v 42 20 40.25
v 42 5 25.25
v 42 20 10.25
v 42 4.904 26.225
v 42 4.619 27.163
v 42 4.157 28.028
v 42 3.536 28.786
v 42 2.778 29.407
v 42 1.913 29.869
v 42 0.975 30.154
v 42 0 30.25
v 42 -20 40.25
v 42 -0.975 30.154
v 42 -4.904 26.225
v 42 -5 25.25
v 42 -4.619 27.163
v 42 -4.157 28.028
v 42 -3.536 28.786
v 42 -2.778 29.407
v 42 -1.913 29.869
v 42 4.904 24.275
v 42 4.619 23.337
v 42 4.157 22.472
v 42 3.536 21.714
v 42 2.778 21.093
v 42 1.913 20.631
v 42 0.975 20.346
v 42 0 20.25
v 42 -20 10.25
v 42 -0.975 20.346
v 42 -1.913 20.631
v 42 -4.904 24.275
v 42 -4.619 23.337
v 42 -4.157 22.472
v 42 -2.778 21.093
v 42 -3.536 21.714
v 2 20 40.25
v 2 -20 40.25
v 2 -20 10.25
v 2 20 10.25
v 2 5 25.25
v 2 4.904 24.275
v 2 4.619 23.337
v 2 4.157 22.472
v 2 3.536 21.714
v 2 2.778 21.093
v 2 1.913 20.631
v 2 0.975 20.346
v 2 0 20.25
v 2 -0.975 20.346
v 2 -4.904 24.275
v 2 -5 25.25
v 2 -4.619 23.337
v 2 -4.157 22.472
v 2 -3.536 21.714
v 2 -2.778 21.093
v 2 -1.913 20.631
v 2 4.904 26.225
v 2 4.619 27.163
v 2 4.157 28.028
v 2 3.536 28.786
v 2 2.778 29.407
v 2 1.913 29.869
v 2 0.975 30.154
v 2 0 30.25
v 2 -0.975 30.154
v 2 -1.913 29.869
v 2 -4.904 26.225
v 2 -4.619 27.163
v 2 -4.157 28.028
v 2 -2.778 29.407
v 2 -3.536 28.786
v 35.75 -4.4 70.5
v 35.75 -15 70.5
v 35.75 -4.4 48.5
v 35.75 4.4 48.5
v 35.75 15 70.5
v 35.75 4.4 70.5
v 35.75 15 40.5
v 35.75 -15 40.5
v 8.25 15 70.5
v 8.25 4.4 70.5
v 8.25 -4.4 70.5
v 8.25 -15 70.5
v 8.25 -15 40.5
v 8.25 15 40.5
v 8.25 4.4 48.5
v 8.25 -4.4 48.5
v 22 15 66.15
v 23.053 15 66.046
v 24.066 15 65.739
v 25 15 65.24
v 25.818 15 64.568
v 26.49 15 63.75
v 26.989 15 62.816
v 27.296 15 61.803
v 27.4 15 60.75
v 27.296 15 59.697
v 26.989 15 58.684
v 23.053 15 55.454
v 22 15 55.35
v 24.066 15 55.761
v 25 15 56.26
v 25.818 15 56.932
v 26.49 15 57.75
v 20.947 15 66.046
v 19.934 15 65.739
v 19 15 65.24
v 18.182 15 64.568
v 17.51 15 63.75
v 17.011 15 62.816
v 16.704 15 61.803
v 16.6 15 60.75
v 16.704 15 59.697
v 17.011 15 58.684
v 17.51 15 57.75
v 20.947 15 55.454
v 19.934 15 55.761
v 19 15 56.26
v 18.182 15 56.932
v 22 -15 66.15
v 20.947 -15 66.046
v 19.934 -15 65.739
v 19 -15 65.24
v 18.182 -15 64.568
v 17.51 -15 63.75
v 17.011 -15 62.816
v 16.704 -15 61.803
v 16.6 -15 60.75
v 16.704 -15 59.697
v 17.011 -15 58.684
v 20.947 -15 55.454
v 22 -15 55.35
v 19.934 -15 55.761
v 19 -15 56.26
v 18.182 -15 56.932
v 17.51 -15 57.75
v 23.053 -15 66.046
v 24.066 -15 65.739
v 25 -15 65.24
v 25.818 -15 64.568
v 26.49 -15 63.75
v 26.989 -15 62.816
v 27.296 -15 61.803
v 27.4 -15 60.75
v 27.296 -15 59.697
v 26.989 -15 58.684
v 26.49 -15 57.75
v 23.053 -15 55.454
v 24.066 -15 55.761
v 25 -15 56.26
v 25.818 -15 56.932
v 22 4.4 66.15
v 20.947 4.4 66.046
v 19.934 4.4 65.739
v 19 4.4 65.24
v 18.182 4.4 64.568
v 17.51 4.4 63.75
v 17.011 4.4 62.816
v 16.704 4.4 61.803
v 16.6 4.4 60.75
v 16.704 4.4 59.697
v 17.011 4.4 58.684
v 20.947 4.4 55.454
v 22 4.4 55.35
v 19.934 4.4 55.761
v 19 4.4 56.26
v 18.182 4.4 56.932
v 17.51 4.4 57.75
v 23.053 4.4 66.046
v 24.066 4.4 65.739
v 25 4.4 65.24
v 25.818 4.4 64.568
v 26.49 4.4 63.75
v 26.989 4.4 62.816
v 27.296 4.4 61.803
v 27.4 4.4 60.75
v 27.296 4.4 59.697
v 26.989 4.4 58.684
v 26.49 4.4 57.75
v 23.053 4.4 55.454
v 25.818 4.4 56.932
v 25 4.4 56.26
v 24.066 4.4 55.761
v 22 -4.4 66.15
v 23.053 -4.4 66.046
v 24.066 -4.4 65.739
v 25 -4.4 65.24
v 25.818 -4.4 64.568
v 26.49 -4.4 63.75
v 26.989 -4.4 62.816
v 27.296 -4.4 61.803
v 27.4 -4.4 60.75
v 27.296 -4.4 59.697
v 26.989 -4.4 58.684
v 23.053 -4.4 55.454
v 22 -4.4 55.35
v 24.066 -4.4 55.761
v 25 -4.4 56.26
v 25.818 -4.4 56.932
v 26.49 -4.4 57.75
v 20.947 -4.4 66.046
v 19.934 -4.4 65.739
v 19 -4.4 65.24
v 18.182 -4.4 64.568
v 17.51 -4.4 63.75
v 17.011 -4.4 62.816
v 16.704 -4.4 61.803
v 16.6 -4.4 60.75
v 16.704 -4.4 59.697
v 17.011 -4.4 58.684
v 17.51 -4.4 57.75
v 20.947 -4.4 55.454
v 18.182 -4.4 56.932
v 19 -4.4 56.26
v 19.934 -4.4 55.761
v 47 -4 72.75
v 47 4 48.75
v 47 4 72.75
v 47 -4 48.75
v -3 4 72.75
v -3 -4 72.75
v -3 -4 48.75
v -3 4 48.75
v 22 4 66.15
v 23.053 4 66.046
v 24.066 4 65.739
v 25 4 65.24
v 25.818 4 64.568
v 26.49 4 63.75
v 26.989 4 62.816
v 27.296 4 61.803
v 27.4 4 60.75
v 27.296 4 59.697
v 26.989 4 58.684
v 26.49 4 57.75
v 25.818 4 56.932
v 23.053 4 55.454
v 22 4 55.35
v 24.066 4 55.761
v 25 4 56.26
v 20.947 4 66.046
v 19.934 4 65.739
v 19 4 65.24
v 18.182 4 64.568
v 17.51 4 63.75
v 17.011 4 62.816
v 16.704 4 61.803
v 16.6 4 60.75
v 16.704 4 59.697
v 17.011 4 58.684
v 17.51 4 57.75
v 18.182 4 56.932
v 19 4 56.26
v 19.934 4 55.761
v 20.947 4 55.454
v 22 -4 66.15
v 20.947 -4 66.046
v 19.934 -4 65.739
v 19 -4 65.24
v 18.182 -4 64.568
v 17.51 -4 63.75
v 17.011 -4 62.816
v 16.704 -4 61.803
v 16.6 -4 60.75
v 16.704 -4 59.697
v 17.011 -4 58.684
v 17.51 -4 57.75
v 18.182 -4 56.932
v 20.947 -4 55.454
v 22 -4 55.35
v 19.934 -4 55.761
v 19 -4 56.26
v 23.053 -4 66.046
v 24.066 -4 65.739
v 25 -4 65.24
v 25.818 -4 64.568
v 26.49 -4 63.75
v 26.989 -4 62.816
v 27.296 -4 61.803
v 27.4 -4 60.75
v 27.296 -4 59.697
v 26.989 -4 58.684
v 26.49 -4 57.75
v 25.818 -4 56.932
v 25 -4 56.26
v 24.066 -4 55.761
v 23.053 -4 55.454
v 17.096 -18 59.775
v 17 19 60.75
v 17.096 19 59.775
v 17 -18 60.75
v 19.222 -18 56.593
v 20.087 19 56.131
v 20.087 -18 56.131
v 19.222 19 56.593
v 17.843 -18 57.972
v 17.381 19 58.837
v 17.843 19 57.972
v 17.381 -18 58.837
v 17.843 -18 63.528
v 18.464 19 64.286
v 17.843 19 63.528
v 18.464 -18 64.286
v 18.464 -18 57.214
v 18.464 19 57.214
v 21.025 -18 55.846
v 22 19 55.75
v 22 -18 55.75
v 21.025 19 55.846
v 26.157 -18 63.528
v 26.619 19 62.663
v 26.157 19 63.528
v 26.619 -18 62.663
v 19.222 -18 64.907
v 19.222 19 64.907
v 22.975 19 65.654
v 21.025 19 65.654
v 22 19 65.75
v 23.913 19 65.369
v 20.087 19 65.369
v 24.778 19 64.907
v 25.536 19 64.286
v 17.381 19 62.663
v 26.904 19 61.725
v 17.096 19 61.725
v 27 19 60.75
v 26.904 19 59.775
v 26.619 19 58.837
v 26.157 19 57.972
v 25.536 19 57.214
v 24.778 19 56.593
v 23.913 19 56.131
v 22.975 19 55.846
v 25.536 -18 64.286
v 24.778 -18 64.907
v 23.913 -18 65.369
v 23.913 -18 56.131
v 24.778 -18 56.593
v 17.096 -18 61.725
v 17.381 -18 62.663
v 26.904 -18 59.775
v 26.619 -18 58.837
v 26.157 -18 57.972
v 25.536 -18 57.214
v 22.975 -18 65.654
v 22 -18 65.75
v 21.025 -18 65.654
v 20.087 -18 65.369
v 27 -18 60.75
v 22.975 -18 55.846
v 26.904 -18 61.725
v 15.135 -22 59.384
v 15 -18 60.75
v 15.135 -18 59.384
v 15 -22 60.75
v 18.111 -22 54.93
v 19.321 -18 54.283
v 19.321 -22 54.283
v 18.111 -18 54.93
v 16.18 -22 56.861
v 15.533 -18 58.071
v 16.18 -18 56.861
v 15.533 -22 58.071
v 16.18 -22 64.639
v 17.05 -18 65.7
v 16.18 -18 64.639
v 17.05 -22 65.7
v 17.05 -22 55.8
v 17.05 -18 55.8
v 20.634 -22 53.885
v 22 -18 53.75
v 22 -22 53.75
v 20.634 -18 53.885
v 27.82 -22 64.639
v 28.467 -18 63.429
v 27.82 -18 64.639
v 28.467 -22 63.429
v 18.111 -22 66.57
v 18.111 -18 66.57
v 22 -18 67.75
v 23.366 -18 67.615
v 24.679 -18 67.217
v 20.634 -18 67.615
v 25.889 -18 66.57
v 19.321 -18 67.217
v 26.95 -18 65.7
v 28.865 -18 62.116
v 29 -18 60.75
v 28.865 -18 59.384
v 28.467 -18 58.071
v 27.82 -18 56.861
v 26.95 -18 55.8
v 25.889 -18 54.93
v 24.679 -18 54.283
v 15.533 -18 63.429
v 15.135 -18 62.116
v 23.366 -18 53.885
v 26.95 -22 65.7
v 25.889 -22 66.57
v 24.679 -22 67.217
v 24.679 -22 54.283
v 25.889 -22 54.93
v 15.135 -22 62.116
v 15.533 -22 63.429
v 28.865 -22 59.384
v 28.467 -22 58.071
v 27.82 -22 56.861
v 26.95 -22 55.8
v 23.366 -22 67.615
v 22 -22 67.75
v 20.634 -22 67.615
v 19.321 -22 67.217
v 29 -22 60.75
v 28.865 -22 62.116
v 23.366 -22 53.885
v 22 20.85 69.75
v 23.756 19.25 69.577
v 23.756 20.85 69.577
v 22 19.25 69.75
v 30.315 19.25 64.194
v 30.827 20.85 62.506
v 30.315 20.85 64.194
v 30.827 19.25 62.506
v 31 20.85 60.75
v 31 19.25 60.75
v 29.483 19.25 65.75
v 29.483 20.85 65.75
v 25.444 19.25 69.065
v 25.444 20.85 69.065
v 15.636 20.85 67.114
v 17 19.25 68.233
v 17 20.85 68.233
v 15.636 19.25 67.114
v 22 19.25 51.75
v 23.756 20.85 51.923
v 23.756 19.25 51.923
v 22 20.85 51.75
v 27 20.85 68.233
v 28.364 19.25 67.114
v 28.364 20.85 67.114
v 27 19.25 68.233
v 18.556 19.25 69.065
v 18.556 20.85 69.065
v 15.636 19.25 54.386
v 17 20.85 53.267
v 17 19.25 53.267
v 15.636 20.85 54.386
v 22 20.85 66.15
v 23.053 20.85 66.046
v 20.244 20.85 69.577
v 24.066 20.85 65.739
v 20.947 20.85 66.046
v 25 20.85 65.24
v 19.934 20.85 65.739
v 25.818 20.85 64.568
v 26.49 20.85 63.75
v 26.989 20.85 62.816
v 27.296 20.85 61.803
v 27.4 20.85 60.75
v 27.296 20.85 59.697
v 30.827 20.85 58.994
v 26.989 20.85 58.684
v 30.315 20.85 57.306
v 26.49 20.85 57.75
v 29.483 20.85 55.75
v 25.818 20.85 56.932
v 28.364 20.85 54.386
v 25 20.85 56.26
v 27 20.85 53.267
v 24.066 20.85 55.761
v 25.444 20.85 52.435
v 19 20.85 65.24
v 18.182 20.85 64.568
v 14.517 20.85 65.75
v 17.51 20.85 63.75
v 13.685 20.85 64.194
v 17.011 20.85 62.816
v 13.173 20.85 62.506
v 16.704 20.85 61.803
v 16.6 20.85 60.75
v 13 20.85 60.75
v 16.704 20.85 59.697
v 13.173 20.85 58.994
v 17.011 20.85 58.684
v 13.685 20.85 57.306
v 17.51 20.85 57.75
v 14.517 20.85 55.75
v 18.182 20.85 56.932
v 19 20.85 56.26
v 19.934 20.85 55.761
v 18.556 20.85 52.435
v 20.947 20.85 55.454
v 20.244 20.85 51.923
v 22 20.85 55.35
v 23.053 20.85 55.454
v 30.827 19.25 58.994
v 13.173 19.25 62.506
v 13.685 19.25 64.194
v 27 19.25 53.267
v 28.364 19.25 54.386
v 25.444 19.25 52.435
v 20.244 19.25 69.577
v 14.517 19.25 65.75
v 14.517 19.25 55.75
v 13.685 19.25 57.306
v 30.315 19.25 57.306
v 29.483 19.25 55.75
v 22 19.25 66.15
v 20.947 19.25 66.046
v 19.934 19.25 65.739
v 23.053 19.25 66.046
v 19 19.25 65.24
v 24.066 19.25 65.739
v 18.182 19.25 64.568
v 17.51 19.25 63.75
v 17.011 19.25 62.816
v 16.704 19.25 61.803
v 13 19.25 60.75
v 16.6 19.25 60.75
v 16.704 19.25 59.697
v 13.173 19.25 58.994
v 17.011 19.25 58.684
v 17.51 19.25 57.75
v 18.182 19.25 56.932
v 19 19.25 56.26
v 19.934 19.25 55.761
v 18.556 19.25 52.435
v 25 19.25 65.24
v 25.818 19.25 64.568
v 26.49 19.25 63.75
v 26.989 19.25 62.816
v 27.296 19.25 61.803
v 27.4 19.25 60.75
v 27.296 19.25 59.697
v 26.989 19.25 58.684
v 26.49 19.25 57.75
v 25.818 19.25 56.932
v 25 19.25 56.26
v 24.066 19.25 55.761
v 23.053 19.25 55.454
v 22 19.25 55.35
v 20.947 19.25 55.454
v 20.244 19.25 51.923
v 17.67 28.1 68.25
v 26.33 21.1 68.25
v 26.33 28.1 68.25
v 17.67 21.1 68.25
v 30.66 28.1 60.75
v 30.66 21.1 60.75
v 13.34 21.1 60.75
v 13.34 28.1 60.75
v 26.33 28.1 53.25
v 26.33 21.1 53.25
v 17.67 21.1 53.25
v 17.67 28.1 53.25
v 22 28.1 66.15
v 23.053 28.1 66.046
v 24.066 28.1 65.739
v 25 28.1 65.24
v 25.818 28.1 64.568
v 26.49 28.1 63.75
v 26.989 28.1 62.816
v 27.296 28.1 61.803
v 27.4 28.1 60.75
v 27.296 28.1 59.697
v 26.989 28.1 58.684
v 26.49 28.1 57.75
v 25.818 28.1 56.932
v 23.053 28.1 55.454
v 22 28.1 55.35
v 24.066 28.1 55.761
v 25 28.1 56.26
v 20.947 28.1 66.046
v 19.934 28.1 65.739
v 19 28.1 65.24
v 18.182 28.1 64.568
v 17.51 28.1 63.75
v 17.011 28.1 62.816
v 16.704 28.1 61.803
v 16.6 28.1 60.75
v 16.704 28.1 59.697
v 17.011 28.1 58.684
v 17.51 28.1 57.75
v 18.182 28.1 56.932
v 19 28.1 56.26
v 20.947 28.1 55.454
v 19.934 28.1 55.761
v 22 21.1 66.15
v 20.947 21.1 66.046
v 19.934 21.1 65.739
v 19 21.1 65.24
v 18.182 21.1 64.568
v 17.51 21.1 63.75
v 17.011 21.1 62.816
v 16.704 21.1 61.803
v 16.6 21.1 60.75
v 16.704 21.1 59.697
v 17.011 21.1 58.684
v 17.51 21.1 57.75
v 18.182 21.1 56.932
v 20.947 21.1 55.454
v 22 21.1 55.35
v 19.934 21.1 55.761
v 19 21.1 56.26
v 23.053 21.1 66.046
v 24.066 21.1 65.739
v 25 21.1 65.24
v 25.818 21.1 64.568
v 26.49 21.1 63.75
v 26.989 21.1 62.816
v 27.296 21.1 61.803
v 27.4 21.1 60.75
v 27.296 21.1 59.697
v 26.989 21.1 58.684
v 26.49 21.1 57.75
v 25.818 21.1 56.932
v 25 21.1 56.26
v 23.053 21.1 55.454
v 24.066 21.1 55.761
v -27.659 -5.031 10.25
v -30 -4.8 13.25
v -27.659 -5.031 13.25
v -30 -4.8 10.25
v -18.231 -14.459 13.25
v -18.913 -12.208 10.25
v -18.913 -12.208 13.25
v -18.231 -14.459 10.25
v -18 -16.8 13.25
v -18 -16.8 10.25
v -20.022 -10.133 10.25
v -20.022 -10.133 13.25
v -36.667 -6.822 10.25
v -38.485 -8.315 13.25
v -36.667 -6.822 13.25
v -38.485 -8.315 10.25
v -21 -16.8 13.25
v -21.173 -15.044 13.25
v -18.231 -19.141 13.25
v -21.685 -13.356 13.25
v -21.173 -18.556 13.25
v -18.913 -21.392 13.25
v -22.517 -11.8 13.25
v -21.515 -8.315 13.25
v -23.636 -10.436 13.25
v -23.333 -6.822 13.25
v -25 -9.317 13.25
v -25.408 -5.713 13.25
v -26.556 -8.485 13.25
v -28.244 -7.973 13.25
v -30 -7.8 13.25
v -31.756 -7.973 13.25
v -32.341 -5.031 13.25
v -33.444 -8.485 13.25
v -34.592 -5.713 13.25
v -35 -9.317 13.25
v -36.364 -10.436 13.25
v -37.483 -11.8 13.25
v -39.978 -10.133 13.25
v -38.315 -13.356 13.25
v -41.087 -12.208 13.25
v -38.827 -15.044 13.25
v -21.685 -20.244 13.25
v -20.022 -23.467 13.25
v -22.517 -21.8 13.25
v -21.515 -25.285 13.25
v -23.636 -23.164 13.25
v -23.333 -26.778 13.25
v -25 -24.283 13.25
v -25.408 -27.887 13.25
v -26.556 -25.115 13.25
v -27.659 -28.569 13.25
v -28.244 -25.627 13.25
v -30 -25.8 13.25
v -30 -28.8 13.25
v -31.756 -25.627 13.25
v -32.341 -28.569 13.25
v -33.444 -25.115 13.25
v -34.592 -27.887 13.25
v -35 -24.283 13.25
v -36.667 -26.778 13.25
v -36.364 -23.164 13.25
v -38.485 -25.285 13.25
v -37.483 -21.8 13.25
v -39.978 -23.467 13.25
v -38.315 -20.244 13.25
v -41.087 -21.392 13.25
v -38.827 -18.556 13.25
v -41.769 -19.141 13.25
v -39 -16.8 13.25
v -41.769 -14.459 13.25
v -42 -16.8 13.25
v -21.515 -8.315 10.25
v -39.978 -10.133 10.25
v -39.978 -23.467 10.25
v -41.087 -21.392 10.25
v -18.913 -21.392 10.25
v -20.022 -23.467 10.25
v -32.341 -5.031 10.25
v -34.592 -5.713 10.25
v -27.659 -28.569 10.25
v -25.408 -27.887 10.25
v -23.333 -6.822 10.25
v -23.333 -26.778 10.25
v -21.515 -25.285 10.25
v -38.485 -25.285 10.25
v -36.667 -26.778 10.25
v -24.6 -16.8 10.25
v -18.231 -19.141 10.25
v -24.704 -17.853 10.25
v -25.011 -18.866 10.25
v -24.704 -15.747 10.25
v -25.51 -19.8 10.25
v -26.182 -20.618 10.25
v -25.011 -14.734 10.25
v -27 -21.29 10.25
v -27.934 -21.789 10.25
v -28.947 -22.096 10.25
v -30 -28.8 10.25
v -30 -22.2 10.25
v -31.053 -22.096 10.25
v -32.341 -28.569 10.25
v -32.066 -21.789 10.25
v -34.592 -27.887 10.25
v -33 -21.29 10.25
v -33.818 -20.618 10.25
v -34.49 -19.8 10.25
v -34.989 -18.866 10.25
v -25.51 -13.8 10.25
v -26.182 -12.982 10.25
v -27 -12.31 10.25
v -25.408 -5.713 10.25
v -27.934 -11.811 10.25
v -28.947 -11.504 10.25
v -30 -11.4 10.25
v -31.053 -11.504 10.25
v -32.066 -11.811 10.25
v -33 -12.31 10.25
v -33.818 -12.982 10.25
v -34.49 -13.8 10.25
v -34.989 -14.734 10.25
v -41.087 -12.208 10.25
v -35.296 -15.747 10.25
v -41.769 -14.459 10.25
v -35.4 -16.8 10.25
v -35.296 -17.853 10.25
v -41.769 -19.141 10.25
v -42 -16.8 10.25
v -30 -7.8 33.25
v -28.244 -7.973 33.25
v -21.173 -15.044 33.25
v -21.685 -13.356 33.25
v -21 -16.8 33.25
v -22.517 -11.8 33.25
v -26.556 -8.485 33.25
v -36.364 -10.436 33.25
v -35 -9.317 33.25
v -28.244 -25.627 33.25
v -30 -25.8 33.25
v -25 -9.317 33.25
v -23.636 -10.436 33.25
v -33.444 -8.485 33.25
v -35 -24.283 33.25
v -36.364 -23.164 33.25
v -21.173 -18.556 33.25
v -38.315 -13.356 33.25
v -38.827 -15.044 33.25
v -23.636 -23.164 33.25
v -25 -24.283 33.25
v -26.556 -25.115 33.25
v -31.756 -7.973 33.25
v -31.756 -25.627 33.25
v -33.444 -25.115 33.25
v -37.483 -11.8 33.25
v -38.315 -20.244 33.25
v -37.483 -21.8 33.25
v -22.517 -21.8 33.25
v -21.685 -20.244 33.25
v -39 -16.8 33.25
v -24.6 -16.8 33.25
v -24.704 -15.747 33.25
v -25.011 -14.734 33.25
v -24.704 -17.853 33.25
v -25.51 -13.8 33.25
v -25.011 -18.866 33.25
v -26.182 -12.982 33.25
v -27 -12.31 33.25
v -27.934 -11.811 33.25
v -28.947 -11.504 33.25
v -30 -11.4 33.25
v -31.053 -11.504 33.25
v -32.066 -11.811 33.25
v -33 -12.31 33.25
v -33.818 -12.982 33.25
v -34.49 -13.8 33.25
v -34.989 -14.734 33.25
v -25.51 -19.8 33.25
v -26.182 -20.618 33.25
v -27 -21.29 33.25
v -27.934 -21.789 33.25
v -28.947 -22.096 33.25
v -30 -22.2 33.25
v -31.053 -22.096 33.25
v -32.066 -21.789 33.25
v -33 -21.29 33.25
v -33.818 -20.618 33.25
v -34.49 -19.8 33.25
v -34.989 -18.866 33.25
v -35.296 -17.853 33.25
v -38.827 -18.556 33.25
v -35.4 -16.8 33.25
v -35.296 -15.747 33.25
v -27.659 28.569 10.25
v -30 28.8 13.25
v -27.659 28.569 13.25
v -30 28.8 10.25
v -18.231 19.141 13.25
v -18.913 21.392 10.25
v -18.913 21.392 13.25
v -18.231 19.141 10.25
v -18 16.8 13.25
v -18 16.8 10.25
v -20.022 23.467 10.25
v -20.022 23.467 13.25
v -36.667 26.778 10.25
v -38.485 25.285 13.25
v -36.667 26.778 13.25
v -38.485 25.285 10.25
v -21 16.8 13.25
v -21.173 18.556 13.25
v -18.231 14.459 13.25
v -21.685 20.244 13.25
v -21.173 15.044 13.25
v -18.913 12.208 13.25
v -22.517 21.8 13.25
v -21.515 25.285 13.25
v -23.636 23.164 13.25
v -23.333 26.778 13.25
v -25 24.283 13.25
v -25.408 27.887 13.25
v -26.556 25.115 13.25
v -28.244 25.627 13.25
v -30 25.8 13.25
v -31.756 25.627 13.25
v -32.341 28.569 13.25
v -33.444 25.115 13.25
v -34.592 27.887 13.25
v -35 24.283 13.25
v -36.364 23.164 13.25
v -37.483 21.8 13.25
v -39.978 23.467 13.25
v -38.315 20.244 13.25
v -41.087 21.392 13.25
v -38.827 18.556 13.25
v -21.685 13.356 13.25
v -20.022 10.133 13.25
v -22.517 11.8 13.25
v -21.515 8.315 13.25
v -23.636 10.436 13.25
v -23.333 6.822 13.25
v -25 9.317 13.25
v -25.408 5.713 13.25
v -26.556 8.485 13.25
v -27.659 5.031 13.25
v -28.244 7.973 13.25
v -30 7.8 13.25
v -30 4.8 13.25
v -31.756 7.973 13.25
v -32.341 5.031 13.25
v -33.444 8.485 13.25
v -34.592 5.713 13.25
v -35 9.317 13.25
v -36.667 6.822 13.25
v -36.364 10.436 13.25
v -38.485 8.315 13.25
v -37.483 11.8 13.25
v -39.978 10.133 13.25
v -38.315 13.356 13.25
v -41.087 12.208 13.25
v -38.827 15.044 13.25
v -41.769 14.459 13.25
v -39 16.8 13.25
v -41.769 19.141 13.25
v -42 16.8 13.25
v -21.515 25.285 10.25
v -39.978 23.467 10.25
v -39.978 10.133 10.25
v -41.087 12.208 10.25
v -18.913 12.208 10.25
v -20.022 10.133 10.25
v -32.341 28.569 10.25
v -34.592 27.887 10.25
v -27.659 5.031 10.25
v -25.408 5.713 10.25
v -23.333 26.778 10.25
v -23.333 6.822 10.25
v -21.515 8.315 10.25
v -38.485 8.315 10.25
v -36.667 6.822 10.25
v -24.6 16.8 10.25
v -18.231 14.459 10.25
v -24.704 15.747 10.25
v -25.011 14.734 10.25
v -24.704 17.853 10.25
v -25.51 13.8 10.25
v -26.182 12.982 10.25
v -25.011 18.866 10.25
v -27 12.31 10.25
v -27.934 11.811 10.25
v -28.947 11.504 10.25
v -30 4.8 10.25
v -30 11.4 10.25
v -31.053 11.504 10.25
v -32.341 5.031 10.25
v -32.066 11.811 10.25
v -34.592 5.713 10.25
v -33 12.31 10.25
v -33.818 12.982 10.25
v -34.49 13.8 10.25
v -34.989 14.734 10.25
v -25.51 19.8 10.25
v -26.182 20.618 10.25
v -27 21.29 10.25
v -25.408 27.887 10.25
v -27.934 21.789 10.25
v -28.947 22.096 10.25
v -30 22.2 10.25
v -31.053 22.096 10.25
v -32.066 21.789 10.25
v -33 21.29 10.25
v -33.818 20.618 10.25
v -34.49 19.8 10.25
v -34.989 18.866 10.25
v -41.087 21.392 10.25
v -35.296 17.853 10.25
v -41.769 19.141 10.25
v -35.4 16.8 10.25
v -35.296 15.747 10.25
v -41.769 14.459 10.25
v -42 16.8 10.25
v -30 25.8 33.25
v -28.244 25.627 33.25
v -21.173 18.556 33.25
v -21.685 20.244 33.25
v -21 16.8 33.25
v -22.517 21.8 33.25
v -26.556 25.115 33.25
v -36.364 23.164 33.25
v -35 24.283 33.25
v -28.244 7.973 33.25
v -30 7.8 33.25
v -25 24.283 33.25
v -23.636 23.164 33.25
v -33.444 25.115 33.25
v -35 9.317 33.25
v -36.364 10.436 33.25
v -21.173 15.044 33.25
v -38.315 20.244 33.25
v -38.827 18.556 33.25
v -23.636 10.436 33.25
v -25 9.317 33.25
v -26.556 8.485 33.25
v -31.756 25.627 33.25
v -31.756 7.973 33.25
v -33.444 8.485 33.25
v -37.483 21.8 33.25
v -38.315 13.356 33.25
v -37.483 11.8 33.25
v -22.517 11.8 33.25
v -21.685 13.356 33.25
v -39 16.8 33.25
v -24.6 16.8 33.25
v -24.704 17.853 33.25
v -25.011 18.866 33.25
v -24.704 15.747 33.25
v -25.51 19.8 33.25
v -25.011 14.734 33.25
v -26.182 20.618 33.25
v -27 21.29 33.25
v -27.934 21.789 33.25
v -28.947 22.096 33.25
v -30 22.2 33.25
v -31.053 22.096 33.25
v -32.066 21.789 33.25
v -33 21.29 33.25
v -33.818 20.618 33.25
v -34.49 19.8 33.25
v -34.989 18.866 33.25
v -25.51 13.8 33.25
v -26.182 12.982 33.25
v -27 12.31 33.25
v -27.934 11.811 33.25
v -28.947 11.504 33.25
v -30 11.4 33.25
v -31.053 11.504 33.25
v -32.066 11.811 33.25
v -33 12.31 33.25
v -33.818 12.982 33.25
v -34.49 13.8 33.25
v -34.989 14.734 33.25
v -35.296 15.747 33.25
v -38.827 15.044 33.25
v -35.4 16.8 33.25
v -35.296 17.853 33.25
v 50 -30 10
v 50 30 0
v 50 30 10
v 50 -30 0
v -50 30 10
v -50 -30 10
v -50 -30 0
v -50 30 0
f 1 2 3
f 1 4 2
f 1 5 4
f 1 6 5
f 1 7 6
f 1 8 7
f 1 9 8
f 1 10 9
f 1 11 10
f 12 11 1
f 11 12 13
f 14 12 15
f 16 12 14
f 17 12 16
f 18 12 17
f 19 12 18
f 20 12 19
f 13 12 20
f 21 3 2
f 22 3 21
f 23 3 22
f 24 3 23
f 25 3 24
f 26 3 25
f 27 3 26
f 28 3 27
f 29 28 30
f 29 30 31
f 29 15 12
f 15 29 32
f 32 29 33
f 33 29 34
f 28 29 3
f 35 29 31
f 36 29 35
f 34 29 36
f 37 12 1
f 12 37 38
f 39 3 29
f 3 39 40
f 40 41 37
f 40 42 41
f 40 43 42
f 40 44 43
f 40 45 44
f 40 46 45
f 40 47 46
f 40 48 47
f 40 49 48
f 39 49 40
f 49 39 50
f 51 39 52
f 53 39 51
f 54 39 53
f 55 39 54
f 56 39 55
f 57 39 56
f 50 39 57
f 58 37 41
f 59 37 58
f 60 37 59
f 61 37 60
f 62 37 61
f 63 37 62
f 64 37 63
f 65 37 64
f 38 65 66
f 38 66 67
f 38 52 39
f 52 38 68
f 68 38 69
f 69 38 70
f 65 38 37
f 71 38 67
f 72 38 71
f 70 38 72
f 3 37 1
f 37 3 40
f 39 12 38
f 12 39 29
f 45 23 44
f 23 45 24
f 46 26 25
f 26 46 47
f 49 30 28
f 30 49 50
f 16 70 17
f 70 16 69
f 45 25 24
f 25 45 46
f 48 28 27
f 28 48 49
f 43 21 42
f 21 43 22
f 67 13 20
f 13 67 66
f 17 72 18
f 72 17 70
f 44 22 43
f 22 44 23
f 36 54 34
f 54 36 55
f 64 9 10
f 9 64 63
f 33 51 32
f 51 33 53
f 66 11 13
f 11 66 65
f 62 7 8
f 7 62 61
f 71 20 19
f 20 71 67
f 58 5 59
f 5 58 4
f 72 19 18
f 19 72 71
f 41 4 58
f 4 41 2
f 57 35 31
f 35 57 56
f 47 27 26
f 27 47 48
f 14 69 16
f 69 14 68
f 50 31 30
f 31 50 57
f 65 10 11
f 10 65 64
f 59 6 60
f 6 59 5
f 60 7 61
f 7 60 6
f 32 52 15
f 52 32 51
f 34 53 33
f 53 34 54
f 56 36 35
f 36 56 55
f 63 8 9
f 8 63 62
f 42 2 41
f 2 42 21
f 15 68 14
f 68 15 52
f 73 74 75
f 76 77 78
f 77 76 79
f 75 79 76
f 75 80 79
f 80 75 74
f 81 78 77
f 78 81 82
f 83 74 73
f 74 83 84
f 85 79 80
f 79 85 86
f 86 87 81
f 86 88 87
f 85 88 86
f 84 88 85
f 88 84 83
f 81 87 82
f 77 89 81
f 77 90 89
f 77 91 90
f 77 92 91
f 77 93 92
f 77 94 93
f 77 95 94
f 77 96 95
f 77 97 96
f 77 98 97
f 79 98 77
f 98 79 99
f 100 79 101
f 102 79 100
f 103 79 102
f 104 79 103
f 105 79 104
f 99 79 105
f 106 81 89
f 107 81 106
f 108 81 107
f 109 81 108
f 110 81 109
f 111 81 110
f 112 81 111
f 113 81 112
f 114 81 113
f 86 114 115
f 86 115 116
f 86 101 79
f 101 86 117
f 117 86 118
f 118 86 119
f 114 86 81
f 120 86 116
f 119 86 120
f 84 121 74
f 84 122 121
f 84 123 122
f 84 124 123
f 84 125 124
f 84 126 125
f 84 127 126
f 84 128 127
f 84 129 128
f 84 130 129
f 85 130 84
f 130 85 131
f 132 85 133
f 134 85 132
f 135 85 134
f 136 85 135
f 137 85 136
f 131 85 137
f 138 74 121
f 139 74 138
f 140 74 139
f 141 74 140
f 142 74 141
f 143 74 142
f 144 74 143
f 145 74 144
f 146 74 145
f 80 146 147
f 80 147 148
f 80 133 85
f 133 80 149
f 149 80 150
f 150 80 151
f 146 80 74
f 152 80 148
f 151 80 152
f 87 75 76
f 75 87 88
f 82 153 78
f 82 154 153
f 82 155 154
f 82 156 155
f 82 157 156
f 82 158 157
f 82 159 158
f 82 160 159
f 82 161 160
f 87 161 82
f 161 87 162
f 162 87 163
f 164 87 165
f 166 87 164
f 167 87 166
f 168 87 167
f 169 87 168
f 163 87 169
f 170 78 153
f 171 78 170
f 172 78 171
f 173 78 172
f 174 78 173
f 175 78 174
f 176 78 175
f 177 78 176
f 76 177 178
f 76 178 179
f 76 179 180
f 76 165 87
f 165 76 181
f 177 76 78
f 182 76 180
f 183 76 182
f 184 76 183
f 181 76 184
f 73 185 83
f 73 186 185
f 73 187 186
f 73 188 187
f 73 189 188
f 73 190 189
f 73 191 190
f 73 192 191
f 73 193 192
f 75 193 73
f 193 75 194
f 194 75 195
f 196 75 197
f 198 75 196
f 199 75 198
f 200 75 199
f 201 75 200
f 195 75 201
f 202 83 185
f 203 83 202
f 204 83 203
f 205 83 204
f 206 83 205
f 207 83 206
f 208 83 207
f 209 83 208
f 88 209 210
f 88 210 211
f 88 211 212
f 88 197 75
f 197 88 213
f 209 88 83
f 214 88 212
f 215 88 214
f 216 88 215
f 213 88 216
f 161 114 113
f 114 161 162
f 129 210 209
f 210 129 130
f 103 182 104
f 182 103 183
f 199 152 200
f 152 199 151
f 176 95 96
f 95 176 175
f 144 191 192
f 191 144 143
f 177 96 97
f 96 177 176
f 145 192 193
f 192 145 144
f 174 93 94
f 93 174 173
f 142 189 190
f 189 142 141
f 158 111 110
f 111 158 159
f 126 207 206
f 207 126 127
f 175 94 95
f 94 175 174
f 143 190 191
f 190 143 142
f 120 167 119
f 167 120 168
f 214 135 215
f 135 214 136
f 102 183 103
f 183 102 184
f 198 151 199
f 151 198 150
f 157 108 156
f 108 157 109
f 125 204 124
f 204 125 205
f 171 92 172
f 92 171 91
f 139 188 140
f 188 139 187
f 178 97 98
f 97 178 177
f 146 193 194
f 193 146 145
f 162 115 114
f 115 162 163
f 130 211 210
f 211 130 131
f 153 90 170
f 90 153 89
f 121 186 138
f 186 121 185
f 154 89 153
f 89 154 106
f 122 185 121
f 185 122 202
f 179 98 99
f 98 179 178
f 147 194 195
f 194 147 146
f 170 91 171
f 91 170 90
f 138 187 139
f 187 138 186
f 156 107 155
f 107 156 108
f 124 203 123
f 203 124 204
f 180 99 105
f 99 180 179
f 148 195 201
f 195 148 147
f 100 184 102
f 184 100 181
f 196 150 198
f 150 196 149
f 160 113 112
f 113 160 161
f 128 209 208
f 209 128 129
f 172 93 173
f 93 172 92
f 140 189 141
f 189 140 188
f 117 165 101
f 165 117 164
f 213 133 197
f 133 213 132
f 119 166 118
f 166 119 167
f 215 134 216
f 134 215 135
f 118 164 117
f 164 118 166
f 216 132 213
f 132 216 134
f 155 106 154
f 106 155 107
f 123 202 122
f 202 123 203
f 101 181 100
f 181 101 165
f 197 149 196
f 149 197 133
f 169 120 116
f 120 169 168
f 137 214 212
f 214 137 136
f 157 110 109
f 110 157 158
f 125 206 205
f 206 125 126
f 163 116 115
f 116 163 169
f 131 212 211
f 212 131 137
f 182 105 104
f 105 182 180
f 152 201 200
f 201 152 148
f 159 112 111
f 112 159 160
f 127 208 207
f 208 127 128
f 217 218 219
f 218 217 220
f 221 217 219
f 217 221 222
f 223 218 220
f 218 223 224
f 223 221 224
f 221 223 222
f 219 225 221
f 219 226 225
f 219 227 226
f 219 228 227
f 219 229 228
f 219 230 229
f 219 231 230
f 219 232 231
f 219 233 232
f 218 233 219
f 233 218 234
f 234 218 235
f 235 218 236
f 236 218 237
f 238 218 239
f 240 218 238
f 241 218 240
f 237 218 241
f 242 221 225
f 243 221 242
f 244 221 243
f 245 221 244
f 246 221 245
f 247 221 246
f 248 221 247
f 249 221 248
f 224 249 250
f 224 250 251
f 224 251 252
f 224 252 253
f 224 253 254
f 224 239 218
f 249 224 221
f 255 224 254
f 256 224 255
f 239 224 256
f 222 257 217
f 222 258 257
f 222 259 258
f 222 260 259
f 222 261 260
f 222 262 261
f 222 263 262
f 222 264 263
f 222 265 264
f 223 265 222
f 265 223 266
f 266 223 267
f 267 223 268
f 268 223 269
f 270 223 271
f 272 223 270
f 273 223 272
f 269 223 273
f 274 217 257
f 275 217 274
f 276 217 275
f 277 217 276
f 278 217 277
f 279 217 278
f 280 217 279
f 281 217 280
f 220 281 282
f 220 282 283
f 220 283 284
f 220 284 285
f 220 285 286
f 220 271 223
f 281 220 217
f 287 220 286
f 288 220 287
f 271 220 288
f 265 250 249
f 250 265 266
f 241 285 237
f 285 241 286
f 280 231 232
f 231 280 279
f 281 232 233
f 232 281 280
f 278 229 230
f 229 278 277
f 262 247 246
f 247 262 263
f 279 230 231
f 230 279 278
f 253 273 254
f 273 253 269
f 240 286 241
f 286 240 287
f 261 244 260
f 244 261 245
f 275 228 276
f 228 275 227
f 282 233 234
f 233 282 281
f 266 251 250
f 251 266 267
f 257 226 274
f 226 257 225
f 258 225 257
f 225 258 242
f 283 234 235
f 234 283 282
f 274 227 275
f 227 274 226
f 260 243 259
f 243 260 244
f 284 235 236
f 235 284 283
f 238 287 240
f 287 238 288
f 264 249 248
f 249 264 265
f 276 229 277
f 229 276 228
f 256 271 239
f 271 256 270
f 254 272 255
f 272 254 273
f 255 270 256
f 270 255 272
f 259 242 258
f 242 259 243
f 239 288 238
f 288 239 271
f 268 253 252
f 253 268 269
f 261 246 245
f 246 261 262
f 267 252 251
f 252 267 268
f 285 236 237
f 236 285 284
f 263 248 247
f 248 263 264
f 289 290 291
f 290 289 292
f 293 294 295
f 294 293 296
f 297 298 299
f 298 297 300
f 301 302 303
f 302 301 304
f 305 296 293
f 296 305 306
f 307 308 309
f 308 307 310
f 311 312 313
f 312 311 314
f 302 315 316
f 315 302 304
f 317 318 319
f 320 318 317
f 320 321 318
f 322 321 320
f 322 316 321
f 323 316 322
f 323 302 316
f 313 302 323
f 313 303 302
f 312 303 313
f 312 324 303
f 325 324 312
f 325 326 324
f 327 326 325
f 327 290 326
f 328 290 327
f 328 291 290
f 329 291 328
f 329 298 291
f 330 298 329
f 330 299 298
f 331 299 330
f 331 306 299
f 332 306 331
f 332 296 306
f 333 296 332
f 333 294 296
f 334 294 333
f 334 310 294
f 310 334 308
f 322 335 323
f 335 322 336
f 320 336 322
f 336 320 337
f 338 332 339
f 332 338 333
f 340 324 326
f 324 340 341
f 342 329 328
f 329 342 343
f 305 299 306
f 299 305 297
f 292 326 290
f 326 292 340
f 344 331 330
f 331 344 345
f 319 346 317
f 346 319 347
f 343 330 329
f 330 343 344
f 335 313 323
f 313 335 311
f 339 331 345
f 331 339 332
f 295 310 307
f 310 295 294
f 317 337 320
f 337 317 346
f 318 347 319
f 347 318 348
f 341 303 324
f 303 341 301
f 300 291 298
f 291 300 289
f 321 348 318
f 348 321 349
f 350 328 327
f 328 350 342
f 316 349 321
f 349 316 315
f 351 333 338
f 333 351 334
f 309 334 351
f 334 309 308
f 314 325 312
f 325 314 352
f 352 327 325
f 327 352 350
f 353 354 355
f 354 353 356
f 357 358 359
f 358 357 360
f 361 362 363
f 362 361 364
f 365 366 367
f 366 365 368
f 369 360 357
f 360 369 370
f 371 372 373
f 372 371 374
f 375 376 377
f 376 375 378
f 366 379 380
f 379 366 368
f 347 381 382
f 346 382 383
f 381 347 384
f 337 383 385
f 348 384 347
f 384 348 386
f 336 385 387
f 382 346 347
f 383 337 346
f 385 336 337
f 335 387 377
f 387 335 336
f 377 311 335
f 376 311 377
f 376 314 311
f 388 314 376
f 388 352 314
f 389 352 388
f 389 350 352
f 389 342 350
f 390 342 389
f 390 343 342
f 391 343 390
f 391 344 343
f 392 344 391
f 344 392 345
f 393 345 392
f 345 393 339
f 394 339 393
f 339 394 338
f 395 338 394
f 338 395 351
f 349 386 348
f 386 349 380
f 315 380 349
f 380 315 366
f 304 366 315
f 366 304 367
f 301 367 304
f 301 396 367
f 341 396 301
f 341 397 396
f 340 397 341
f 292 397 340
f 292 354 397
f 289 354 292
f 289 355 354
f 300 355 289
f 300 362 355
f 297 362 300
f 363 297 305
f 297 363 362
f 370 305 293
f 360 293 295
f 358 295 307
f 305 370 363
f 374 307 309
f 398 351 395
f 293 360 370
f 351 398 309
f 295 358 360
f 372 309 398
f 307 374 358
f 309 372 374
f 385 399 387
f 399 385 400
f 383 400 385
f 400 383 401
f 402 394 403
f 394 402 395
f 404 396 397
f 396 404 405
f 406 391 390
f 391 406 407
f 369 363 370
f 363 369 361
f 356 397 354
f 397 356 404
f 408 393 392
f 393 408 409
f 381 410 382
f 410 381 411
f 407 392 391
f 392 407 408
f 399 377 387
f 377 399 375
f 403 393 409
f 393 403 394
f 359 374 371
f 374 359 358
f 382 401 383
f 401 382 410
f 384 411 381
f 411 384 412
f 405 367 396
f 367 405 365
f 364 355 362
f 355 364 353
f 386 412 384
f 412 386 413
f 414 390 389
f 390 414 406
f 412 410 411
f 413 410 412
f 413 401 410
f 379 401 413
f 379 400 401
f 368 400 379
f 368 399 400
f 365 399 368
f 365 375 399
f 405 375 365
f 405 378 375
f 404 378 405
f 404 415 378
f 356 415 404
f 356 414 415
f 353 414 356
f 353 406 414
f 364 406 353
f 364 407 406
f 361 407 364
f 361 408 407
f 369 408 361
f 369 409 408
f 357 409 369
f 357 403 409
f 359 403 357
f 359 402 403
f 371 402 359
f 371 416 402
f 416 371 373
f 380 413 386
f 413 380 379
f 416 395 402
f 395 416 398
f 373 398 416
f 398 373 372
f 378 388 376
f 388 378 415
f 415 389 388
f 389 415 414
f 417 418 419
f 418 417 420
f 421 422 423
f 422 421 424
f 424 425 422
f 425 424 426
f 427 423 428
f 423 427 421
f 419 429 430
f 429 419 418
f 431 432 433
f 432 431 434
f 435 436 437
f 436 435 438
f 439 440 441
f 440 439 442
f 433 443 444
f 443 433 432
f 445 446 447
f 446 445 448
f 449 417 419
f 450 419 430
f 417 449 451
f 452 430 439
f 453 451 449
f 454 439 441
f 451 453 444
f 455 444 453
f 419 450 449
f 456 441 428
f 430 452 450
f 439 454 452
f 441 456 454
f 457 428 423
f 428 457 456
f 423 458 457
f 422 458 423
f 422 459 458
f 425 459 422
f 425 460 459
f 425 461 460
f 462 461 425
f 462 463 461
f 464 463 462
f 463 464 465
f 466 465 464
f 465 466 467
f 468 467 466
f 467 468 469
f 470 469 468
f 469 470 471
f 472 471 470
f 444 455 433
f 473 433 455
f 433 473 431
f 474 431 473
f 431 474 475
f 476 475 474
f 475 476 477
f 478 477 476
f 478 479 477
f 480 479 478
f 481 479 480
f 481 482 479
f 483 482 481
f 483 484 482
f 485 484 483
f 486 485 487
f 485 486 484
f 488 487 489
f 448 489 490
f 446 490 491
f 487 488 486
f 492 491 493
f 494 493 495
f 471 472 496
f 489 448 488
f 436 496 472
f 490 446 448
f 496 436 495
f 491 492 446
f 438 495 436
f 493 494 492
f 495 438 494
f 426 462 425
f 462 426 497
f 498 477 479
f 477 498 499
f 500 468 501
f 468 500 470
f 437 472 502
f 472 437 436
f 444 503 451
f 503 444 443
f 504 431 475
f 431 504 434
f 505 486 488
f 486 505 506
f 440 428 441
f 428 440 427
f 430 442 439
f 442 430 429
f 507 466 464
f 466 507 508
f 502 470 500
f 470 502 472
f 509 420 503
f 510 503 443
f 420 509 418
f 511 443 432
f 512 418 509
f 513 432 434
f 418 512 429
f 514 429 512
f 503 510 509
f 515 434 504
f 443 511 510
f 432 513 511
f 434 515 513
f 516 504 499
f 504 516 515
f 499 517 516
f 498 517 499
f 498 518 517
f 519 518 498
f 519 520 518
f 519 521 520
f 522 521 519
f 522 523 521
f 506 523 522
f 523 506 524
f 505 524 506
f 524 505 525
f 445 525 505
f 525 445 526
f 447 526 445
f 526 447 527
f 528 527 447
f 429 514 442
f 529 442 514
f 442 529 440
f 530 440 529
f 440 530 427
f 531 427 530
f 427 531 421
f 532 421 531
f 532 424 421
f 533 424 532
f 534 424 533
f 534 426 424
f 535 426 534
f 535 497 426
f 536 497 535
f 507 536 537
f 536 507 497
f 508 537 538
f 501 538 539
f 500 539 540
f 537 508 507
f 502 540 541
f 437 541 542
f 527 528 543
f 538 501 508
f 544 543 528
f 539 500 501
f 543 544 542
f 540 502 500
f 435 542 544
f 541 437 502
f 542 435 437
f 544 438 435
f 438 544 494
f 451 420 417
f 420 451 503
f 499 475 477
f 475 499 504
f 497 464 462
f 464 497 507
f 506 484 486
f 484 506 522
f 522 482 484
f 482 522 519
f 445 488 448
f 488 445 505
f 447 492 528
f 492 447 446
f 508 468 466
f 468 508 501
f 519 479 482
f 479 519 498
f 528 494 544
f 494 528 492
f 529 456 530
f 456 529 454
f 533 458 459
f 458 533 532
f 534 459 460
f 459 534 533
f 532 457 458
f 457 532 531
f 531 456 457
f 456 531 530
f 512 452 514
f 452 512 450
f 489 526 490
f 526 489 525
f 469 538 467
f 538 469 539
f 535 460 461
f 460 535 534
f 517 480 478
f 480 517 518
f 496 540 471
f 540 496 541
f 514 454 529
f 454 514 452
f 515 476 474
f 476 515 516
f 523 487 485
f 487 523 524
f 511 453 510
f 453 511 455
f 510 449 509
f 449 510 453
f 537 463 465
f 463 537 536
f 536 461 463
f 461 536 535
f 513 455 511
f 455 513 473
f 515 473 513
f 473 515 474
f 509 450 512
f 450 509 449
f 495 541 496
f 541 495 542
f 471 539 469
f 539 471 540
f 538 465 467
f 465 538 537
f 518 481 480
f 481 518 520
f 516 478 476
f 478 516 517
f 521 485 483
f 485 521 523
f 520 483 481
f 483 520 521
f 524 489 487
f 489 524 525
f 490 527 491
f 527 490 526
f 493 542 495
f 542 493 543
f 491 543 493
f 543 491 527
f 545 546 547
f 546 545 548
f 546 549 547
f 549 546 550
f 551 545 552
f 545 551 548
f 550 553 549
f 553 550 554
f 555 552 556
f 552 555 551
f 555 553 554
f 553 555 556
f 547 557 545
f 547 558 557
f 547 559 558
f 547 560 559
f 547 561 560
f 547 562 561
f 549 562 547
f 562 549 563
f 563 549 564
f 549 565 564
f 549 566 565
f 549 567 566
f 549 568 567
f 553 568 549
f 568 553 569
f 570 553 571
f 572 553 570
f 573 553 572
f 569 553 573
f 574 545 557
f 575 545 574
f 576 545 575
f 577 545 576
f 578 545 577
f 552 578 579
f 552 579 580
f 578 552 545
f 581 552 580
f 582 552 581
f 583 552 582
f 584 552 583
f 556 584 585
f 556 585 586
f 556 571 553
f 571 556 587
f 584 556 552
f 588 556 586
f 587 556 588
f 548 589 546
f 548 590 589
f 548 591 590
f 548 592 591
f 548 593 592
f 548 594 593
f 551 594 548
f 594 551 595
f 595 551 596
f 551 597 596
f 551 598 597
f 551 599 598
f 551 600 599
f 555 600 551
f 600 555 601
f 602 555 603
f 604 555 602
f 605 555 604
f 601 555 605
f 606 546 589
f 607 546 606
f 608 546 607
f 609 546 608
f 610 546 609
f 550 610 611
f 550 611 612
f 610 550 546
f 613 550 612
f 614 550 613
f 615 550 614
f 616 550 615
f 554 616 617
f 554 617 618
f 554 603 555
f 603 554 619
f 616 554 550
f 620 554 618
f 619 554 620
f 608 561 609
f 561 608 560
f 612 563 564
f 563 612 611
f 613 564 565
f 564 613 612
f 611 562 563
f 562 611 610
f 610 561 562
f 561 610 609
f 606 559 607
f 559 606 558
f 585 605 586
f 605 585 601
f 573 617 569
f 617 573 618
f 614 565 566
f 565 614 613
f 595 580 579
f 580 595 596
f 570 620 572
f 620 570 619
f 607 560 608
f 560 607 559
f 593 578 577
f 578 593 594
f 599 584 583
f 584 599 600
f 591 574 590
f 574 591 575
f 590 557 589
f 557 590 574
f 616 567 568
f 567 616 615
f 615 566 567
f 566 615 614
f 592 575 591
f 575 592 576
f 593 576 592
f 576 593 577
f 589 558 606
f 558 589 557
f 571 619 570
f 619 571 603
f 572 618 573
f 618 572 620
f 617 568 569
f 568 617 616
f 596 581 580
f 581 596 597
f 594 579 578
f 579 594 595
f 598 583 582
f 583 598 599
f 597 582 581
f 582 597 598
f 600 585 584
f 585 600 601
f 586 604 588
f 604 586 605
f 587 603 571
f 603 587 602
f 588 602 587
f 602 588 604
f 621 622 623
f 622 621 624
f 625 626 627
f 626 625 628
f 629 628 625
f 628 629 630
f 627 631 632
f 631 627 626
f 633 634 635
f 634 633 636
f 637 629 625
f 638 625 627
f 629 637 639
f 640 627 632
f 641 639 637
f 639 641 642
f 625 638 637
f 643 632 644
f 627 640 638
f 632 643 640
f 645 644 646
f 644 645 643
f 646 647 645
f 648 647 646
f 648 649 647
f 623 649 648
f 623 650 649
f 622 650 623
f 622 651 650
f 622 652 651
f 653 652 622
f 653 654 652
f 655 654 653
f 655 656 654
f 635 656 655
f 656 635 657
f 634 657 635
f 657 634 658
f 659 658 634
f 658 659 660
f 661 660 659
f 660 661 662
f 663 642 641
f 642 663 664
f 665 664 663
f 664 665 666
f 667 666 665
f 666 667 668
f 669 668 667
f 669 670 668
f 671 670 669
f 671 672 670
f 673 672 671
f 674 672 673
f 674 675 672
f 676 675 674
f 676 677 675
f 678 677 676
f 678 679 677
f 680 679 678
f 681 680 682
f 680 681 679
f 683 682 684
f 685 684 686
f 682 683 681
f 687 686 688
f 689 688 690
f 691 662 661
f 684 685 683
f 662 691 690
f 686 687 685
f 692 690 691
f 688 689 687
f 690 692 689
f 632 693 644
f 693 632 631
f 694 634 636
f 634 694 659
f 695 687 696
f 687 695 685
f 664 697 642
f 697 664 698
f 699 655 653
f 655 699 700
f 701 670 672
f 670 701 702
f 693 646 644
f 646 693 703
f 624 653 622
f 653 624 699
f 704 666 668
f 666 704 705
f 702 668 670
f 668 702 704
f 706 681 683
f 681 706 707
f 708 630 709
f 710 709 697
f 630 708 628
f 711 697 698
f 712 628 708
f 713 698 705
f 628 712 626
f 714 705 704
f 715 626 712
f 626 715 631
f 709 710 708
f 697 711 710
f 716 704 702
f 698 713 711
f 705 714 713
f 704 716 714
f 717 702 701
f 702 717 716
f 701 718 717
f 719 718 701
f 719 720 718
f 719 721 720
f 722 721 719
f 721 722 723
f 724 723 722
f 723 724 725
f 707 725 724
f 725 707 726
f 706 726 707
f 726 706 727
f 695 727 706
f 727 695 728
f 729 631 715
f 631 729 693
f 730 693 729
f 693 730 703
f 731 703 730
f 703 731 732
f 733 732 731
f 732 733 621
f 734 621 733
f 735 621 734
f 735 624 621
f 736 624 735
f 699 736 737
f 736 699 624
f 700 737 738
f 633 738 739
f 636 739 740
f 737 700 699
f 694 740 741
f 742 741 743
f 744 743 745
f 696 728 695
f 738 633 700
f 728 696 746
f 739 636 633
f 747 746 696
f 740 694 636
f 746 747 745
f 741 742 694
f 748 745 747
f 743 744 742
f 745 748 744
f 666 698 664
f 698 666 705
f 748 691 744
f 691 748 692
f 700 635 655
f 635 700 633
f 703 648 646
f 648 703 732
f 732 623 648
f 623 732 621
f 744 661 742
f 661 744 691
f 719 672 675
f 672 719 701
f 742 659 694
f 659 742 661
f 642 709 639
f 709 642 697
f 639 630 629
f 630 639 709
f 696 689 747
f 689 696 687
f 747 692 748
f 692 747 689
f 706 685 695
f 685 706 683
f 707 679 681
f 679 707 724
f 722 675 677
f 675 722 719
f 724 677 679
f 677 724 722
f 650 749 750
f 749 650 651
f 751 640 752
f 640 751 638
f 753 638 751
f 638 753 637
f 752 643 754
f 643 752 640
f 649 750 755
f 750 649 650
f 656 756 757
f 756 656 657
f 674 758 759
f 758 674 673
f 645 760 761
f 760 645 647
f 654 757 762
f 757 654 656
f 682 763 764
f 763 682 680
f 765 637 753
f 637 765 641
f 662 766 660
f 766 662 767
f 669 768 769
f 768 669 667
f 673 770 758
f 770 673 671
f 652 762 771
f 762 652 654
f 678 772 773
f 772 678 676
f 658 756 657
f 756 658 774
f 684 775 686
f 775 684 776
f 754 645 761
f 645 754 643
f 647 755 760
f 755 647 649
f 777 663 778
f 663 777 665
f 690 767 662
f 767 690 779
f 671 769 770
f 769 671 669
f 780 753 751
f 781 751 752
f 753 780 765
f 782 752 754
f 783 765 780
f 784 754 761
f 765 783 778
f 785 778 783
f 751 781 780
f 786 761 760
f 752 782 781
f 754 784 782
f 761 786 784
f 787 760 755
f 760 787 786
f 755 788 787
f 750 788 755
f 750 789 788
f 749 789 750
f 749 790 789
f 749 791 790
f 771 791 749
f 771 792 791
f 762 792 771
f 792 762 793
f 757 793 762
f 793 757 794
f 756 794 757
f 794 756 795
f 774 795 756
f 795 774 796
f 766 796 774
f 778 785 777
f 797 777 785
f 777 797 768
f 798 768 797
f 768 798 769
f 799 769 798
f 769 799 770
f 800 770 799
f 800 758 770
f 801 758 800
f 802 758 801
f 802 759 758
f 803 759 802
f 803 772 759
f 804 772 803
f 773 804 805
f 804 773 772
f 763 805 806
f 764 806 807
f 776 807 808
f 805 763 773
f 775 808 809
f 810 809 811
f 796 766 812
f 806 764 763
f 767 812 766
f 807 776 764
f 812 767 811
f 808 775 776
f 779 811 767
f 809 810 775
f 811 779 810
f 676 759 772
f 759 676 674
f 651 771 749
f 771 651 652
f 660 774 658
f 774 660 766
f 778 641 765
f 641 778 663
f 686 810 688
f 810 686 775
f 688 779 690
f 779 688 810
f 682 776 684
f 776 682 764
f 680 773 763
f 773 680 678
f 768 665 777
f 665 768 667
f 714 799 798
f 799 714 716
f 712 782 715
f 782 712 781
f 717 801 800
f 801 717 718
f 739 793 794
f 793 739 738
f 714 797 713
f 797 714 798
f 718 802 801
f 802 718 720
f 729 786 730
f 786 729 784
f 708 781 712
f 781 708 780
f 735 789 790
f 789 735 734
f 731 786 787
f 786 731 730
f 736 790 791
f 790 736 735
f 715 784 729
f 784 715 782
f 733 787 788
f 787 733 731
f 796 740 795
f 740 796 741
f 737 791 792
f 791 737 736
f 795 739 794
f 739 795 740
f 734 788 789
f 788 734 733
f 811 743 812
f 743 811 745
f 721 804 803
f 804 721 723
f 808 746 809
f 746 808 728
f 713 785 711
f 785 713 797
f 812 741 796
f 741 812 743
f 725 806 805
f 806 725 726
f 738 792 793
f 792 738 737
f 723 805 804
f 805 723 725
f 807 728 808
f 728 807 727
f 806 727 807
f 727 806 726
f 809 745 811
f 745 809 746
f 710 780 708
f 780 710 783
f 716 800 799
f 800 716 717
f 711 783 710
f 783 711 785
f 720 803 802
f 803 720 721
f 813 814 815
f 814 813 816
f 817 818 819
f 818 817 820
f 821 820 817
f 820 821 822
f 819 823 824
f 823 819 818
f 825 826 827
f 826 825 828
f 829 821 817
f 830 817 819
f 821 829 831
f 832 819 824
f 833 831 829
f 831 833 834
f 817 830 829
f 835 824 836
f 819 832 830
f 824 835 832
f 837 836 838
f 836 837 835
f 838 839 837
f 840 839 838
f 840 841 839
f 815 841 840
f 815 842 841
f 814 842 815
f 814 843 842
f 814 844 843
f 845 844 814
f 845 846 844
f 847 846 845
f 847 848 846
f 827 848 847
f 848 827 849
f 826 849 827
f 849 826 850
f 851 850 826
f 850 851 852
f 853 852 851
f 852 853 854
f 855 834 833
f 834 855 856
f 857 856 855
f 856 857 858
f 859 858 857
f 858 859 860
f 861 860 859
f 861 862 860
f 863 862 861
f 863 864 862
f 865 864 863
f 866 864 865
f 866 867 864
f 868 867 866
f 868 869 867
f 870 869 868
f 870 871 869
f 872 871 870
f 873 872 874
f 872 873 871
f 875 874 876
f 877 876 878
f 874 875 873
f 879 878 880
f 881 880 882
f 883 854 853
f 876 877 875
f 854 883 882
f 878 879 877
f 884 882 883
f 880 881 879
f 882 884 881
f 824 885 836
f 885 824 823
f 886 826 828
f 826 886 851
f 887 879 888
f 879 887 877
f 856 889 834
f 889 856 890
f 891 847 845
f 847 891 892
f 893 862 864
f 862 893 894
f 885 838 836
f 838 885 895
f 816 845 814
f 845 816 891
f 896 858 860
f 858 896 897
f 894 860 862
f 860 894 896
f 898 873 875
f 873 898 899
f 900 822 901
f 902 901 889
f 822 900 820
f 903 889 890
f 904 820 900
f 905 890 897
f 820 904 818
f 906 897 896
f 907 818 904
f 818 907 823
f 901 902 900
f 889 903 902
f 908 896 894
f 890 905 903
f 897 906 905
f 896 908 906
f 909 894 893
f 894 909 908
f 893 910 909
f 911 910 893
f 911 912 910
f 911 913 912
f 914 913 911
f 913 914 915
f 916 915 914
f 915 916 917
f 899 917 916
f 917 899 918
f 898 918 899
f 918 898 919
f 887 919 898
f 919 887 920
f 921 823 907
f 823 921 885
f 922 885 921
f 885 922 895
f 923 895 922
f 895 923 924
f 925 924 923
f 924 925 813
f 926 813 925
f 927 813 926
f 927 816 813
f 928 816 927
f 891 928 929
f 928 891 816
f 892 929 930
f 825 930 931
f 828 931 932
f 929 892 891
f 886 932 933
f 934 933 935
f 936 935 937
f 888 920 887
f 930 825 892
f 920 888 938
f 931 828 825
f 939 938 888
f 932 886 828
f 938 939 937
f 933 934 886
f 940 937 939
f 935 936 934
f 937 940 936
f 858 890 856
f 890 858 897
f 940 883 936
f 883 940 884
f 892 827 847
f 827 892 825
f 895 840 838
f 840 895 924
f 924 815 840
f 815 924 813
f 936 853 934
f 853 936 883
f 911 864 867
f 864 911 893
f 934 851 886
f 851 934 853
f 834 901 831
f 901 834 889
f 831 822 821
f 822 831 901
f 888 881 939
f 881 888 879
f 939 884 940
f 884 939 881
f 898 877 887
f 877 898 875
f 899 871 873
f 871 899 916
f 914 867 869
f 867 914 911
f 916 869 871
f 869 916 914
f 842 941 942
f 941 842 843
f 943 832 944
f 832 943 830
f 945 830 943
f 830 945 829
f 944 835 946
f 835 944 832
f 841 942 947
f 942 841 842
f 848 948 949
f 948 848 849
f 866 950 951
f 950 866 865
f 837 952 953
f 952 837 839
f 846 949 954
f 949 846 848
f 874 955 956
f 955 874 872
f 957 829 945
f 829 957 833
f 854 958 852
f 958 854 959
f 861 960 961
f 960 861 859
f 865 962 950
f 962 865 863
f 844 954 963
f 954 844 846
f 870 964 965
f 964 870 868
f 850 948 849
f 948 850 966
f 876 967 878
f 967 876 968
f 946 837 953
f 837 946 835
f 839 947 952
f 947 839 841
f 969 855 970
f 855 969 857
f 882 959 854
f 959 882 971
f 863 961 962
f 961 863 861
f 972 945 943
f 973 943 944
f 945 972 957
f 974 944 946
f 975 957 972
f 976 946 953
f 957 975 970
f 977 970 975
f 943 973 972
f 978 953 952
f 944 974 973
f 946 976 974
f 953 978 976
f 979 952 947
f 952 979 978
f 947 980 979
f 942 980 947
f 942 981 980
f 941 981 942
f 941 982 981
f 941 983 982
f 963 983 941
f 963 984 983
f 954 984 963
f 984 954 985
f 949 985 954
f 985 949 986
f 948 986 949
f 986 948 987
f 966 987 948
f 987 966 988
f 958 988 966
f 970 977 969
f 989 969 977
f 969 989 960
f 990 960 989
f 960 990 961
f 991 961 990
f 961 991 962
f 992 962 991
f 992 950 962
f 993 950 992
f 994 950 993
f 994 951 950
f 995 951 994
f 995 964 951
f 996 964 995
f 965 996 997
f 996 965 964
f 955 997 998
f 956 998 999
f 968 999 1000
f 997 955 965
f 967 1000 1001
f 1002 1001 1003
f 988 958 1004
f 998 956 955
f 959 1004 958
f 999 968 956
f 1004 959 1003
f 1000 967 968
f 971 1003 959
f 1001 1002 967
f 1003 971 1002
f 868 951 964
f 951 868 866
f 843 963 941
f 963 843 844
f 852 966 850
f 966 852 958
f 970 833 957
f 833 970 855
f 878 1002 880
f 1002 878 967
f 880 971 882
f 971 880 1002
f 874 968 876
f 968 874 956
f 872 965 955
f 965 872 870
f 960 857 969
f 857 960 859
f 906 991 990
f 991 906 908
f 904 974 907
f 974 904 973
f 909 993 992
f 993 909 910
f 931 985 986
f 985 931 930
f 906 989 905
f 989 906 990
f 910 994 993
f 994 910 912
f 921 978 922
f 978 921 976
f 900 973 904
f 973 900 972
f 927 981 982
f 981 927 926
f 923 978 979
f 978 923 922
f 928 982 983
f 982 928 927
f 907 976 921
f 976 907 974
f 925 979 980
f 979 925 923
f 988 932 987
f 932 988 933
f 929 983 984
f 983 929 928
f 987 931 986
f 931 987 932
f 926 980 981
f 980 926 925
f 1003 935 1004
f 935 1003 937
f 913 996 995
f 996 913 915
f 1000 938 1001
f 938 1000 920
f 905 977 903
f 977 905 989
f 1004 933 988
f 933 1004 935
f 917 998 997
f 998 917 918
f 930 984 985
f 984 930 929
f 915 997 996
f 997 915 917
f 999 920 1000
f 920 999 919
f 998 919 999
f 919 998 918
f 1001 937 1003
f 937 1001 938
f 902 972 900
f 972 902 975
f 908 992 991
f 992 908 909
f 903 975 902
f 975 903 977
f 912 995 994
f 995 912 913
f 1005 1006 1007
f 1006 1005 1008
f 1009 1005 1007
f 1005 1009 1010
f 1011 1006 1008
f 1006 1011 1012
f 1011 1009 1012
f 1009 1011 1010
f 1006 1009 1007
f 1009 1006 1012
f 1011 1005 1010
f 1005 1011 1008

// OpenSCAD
$fn = 32;

// ------------------------------------------------------------------------
// Indexing jig: plate 100 x 60 mm, pin d10
// Every part is its own module, assembly() places every instance.
// ------------------------------------------------------------------------

// --- part 1 ---
module jig_plate() {
  difference() {
    translate([-50, -30, 0]) cube([100, 60, 10]);
  }
}

// --- part 2 ---
module locator_block() {
  difference() {
    translate([-20, -20, 0]) cube([40, 40, 30]);
    translate([0, 0, 15]) rotate([0, 90, 0]) cylinder(h = 42, d = 10, center = true);
  }
}

// --- part 3 ---
module index_fork() {
  difference() {
    translate([-13.75, -15, 0]) cube([27.5, 30, 30]);
    translate([-14.75, -4.4, 8]) cube([29.5, 8.8, 23]);
    translate([0, 0, 20.25]) rotate([90, 0, 0]) cylinder(h = 32, d = 10.8, center = true);
  }
}

// --- part 4 ---
module index_arm() {
  difference() {
    translate([-25, -4, 0]) cube([50, 8, 24]);
    translate([0, 0, 12]) rotate([90, 0, 0]) cylinder(h = 10, d = 10.8, center = true);
  }
}

// --- part 5 ---
module index_pin() {
  rotate([0, 90, 0]) cylinder(h = 38, d = 10, center = true);
  translate([-22, 0, 0]) rotate([0, 90, 0]) cylinder(h = 4, d = 14);
}

// --- part 6 ---
module pin_washer() {
  difference() {
      translate([0, 0, 0]) cylinder(h = 1.6, d = 18);
      translate([0, 0, -1]) cylinder(h = 3.6, d = 10.8);
    }
}

// --- part 7 ---
module lock_nut() {
  difference() {
    linear_extrude(height = 7) polygon(points = [[8.66, 0], [4.33, 7.5], [-4.33, 7.5], [-8.66, 0], [-4.33, -7.5], [4.33, -7.5]]);
    translate([0, 0, -1]) cylinder(h = 9, d = 10.8);
  }
}

// --- part 8 ---
module guide_bush_a() {
  difference() {
    union() {
      cylinder(h = 3, d = 24);
      translate([0, 0, 3]) cylinder(h = 20, d = 18);
    }
    translate([0, 0, -1]) cylinder(h = 25, d = 10.8);
  }
}

// --- part 9 ---
module guide_bush_b() {
  difference() {
    union() {
      cylinder(h = 3, d = 24);
      translate([0, 0, 3]) cylinder(h = 20, d = 18);
    }
    translate([0, 0, -1]) cylinder(h = 25, d = 10.8);
  }
}

// --- assembly ---
module assembly() {
  color([0.80, 0.24, 0.20]) translate([0, 0, 0]) rotate([0, 0, 0]) jig_plate();
  color([0.20, 0.45, 0.75]) translate([22, 0, 10.25]) rotate([0, 0, 0]) locator_block();
  color([0.25, 0.62, 0.32]) translate([22, 0, 40.5]) rotate([0, 0, 0]) index_fork();
  color([0.92, 0.70, 0.18]) translate([22, 0, 48.75]) rotate([0, 0, 0]) index_arm();
  color([0.58, 0.35, 0.70]) translate([22, 0, 60.75]) rotate([0, 0, 90]) index_pin();
  color([0.16, 0.66, 0.66]) translate([22, 20.85, 60.75]) rotate([90, 0, 0]) pin_washer();
  color([0.85, 0.48, 0.18]) translate([22, 28.1, 60.75]) rotate([90, 0, 0]) lock_nut();
  color([0.55, 0.60, 0.65]) translate([-30, -16.8, 10.25]) rotate([0, 0, 0]) guide_bush_a();
  color([0.75, 0.30, 0.55]) translate([-30, 16.8, 10.25]) rotate([0, 0, 0]) guide_bush_b();
}

assembly();
